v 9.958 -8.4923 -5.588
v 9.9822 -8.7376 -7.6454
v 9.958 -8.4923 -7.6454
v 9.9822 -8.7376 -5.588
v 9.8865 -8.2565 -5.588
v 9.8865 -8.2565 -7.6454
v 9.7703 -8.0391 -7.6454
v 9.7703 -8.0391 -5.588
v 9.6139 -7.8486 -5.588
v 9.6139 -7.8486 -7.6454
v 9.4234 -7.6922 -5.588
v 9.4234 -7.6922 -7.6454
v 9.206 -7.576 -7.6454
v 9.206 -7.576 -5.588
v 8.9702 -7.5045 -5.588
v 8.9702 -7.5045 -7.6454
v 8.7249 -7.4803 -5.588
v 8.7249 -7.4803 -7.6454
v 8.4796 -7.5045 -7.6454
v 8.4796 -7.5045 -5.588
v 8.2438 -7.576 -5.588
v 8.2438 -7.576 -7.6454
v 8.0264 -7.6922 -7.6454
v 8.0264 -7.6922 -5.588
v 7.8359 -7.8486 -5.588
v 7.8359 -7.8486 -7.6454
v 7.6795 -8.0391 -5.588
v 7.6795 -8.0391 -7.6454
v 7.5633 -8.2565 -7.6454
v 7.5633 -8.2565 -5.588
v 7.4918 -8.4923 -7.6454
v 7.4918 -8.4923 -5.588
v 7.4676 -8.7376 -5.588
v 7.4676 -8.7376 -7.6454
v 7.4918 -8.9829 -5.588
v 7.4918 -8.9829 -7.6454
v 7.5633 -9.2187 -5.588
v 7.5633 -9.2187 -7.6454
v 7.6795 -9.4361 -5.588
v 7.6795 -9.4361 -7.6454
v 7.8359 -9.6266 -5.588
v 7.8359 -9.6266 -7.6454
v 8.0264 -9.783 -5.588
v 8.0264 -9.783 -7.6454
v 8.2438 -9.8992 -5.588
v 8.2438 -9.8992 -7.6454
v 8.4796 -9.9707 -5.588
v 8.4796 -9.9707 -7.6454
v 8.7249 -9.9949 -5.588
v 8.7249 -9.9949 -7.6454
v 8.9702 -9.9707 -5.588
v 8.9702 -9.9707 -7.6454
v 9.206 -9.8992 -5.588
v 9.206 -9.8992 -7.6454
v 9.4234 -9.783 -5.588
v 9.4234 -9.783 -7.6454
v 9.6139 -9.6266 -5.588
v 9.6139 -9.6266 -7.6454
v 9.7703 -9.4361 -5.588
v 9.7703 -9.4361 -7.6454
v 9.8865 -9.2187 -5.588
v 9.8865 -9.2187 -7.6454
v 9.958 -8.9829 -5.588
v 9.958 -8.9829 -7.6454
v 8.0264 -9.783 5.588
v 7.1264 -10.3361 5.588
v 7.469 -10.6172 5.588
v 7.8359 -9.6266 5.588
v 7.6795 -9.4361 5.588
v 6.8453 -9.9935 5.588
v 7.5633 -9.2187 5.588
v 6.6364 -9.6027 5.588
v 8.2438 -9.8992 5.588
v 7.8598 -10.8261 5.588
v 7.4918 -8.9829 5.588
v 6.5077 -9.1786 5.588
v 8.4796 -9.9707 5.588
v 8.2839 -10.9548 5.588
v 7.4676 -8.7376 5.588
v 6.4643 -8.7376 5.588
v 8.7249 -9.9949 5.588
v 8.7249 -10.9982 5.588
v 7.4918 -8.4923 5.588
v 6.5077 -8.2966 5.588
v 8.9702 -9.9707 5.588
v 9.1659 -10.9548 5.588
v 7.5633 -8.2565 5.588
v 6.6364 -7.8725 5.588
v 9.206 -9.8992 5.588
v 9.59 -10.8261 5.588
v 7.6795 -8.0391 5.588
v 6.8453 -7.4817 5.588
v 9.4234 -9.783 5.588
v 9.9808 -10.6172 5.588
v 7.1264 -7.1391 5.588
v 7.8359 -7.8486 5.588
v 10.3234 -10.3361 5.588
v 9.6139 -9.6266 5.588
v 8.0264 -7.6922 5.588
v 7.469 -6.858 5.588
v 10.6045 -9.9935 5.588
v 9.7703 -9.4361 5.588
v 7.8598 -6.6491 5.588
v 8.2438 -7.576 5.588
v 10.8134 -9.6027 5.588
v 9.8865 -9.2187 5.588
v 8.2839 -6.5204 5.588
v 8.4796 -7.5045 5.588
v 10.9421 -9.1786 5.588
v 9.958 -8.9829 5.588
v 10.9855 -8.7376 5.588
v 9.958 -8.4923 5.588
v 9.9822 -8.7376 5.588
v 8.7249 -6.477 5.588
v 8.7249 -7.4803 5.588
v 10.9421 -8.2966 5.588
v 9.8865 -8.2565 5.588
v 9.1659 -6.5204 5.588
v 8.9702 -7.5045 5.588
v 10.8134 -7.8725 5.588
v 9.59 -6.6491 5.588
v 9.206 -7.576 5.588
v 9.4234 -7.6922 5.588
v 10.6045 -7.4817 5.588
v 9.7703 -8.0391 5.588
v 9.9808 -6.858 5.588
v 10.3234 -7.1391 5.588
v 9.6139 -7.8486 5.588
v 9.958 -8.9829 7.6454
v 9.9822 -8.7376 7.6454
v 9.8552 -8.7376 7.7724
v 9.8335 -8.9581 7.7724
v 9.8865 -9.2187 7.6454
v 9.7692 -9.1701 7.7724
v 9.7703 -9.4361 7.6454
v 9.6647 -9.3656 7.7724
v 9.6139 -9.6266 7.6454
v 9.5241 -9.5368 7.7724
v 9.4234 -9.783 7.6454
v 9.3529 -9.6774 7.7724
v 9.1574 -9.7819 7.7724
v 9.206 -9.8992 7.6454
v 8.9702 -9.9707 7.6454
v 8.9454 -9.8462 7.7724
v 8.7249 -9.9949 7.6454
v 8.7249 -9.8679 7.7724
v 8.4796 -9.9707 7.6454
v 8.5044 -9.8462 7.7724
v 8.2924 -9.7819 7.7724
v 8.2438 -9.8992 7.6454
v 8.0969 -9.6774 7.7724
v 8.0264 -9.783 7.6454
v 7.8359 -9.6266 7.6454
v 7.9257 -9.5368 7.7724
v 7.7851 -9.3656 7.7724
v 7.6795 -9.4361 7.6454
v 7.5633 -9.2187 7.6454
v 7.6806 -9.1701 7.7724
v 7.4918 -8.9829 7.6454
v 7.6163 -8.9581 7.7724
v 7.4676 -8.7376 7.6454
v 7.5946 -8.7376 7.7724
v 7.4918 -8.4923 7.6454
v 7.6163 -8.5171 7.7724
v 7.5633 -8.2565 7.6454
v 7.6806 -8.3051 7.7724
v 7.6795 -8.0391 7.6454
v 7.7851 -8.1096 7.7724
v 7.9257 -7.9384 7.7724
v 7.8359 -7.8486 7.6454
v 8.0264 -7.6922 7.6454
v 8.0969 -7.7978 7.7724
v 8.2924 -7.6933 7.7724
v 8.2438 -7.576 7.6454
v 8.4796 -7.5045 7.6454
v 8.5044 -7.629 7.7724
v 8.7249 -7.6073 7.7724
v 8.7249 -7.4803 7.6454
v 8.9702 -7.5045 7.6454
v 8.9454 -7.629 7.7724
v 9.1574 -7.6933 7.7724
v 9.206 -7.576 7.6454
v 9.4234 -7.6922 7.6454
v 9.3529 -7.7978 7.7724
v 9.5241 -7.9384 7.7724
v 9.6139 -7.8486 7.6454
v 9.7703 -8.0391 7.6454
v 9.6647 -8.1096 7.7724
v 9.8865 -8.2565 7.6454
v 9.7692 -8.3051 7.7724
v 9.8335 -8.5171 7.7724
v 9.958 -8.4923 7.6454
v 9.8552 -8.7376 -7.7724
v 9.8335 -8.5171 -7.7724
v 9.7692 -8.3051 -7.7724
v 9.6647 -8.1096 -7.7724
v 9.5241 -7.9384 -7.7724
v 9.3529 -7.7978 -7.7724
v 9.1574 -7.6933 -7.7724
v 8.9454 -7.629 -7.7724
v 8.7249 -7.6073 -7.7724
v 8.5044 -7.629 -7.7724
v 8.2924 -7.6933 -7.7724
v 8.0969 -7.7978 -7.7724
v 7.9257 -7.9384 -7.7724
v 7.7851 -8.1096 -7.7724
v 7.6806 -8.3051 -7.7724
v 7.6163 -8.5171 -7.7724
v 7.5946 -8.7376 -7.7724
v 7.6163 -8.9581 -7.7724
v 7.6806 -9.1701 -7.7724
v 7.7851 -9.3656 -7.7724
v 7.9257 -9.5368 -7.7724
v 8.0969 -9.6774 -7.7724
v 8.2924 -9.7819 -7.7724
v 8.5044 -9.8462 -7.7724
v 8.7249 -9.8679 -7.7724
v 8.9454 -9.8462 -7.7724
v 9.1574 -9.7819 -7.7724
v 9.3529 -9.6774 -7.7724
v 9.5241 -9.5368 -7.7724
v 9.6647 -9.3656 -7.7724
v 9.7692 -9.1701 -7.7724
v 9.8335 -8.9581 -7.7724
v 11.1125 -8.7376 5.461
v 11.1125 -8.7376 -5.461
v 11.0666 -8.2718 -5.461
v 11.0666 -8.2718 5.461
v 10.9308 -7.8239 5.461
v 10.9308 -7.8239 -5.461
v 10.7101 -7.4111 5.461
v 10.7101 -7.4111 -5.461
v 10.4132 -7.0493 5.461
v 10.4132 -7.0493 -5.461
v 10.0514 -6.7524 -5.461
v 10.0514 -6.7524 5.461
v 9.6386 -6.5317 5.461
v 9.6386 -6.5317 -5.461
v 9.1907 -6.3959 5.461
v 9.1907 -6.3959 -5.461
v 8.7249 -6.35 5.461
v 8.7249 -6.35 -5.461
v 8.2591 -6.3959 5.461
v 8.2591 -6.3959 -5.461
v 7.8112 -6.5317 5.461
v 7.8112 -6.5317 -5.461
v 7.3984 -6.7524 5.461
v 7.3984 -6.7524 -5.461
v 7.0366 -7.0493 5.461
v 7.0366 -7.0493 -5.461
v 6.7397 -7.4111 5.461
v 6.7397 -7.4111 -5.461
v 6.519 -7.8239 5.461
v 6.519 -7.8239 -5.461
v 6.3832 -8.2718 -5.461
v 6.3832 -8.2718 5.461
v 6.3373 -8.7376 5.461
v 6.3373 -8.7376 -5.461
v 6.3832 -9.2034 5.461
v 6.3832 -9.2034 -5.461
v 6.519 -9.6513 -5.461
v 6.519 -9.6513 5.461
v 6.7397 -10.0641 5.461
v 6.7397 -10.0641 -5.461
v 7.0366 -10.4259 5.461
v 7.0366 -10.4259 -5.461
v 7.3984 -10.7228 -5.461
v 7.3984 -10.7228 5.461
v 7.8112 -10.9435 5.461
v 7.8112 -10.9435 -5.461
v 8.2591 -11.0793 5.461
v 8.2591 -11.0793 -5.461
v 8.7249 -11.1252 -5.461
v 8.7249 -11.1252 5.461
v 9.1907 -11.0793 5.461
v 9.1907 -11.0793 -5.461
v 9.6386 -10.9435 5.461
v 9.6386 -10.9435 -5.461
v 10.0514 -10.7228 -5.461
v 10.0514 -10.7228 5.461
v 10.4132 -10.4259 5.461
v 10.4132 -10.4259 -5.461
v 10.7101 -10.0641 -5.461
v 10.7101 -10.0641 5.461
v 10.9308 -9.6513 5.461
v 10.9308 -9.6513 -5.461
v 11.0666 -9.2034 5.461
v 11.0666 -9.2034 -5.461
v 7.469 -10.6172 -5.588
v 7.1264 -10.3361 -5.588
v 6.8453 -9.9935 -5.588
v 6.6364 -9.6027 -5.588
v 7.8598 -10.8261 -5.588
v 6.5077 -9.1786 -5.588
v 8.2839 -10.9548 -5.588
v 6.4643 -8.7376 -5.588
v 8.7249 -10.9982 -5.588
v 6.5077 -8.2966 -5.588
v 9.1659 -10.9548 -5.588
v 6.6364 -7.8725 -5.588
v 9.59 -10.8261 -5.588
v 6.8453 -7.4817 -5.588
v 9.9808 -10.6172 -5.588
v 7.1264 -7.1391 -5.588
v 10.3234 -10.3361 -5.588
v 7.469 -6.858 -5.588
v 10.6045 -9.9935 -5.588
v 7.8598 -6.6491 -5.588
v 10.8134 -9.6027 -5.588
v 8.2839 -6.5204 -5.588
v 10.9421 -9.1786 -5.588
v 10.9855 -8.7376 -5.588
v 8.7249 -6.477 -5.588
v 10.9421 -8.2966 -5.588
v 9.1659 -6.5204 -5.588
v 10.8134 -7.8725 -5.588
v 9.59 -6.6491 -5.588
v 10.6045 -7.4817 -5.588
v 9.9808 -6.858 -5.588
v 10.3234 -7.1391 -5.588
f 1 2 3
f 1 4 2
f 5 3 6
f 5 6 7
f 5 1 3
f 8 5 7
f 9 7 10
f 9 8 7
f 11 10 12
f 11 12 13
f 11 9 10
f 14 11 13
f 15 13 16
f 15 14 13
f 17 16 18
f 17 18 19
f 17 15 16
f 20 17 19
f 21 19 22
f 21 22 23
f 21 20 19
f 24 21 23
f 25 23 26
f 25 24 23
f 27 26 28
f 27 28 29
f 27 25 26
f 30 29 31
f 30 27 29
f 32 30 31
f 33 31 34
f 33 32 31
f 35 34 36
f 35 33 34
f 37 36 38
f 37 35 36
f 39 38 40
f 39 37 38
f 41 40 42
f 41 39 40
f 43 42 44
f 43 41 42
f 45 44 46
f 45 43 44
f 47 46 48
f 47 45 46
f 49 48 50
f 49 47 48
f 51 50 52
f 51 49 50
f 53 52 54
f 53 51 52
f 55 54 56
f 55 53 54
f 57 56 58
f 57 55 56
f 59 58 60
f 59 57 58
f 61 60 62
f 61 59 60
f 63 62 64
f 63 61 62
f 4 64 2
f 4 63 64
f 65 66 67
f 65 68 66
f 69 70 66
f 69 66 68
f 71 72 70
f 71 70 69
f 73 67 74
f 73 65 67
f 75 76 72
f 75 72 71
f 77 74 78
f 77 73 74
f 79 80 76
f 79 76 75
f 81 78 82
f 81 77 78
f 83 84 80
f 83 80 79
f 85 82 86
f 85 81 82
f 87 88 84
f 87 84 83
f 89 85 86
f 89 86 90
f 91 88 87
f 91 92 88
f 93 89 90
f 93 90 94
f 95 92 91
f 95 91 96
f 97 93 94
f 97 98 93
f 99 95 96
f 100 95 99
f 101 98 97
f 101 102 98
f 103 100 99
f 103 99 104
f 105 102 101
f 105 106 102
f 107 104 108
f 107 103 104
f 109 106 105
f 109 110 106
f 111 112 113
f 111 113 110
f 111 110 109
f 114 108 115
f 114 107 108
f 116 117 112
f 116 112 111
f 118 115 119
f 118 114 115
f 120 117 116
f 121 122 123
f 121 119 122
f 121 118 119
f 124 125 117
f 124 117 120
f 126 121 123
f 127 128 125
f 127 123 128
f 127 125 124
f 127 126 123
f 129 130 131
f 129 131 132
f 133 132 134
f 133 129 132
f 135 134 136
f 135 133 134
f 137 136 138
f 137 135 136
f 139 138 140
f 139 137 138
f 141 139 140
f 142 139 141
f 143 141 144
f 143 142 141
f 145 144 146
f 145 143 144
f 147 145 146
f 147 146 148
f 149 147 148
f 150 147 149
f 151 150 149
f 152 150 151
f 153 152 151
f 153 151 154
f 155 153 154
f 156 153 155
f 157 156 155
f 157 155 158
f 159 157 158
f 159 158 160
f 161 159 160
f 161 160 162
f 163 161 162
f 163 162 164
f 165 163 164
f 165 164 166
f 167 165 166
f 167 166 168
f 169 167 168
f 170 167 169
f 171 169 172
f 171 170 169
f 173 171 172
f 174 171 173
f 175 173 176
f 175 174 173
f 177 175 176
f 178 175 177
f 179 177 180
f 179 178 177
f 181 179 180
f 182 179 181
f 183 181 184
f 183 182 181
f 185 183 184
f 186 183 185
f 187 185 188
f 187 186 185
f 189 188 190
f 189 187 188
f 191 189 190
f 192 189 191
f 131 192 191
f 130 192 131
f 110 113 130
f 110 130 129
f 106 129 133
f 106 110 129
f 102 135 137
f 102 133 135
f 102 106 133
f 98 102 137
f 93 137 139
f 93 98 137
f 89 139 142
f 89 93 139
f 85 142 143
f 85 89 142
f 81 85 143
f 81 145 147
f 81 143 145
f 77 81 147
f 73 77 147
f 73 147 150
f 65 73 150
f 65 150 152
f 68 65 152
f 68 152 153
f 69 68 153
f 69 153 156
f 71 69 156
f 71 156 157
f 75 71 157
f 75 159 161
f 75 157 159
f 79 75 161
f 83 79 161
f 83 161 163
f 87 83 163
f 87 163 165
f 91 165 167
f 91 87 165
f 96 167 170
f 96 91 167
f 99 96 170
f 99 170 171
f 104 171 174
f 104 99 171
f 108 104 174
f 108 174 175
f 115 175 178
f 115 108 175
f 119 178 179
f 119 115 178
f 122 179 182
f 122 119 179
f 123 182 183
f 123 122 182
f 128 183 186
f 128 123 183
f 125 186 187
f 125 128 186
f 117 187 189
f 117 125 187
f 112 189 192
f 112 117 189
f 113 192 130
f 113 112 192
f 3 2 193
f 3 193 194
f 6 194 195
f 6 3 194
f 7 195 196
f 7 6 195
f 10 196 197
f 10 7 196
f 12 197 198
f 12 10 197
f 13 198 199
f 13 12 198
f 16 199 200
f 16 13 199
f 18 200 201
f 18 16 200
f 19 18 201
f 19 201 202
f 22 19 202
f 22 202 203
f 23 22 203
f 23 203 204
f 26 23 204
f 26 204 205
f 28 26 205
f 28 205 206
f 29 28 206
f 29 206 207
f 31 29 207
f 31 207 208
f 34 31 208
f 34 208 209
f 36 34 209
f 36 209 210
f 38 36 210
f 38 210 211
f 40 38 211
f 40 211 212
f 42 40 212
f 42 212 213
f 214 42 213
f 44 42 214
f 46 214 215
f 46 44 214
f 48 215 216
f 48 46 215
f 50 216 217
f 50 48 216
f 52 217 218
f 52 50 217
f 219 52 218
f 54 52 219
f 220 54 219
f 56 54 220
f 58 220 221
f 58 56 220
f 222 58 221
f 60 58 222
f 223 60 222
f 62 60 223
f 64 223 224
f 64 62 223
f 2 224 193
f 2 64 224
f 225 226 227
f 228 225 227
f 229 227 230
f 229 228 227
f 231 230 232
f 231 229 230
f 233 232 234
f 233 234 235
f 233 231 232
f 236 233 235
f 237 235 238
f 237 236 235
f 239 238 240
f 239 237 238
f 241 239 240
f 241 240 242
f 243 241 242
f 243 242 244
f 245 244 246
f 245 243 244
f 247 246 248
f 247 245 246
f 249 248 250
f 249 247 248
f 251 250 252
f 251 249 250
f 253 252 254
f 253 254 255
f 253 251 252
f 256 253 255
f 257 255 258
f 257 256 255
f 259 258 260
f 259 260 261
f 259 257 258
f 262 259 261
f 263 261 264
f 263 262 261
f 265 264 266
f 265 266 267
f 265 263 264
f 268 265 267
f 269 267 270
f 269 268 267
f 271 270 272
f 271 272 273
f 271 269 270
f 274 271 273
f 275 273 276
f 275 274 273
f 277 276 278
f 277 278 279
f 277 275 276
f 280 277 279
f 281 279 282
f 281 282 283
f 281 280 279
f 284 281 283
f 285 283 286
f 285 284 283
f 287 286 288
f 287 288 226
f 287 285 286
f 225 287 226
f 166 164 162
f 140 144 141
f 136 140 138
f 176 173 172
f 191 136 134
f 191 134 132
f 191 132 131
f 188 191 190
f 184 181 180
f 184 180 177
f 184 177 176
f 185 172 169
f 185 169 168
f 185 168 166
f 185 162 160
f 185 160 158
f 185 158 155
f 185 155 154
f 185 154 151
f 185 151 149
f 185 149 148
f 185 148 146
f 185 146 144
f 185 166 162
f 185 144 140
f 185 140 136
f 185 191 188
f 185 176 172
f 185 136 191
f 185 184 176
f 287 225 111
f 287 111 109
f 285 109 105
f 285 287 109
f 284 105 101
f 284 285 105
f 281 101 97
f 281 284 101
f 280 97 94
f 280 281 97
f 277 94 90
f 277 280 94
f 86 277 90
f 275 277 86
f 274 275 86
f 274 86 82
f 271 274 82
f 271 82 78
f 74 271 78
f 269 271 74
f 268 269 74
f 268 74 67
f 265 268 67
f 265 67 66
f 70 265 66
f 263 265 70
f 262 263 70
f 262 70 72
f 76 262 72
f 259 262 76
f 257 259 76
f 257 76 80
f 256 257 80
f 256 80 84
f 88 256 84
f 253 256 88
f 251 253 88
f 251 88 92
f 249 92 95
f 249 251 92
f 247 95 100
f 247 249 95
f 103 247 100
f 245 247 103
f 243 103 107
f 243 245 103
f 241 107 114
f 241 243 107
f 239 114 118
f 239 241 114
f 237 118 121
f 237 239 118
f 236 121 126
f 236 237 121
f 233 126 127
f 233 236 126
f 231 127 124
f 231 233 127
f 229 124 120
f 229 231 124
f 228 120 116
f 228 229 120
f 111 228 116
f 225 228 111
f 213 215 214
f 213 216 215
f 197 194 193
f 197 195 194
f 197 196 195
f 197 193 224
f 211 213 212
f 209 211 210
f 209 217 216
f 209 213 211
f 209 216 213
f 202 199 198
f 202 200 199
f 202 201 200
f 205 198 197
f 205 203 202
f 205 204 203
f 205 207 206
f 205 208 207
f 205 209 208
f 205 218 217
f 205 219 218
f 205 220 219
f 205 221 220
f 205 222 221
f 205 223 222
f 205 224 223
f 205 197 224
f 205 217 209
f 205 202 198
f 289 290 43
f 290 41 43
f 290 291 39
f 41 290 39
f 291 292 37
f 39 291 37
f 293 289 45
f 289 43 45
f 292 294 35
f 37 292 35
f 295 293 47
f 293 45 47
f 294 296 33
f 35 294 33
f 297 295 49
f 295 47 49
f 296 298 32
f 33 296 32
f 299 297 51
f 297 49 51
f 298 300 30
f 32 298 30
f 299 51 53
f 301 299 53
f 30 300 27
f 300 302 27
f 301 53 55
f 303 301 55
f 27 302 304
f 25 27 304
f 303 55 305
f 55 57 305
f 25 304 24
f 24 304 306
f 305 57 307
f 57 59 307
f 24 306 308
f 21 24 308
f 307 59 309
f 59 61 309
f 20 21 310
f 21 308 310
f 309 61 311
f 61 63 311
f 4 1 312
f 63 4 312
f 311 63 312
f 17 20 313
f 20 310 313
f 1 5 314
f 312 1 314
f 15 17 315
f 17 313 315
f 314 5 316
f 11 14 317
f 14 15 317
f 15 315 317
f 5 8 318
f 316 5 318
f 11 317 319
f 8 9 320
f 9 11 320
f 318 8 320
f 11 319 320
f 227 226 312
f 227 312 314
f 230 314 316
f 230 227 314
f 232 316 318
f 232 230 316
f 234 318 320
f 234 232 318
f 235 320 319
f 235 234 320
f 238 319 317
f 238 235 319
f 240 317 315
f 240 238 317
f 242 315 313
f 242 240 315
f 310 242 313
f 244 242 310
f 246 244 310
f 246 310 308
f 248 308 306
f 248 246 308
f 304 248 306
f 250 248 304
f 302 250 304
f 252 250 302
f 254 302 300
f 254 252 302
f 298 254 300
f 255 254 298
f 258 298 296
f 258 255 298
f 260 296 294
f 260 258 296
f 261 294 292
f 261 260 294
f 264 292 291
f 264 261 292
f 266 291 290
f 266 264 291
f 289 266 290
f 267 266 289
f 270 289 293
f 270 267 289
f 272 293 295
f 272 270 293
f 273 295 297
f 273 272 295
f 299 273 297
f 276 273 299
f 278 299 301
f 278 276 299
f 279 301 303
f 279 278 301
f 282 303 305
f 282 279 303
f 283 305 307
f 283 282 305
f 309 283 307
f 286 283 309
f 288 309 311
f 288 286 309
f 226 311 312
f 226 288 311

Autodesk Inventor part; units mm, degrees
ref_plane "YZ Plane" through (0, 0, 0) normal (1, 0, 0) x (0, 1, 0)
ref_plane "XZ Plane" through (0, 0, 0) normal (0, 1, 0) x (-1, 0, 0)
ref_plane "XY Plane" through (0, 0, 0) normal (0, 0, 1) x (1, 0, 0)
sketch "Sketch1" plane through (0, 0, 0) normal (0, 0, 1) x (1, 0, 0)
  circle A0 centre (8.7249, -8.7376) radius 1.2573 projected
  circle A1 centre (8.7249, -8.7376) radius 2.3876
  dimension "d0" = 4.7752
extrude "Extrusion1" add sketch "Sketch1" along normal mid plane 11.176 contours A0 | A1
sketch "Sketch2" plane through (8.7249, -8.7376, 5.588) normal (0, 0, 1) x (1, 0, 0)
  circle A0 centre (0, 0) radius 1.2573 projected
extrude "Extrusion2" add sketch "Sketch2" along normal blind 2.1844
mirror "Mirror1" about plane through (0, 0, 0) normal (0, 0, 1) of "Extrusion2"
chamfer "Chamfer1" distance 0.127 angle 45 4 edges at (7.4676, -8.7376, 7.7724) (6.3373, -8.7376, 5.588) (6.3373, -8.7376, -5.588) (7.4676, -8.7376, -7.7724)
properties part number "Channel - Hinge Pin" material "Steel, Mild"
